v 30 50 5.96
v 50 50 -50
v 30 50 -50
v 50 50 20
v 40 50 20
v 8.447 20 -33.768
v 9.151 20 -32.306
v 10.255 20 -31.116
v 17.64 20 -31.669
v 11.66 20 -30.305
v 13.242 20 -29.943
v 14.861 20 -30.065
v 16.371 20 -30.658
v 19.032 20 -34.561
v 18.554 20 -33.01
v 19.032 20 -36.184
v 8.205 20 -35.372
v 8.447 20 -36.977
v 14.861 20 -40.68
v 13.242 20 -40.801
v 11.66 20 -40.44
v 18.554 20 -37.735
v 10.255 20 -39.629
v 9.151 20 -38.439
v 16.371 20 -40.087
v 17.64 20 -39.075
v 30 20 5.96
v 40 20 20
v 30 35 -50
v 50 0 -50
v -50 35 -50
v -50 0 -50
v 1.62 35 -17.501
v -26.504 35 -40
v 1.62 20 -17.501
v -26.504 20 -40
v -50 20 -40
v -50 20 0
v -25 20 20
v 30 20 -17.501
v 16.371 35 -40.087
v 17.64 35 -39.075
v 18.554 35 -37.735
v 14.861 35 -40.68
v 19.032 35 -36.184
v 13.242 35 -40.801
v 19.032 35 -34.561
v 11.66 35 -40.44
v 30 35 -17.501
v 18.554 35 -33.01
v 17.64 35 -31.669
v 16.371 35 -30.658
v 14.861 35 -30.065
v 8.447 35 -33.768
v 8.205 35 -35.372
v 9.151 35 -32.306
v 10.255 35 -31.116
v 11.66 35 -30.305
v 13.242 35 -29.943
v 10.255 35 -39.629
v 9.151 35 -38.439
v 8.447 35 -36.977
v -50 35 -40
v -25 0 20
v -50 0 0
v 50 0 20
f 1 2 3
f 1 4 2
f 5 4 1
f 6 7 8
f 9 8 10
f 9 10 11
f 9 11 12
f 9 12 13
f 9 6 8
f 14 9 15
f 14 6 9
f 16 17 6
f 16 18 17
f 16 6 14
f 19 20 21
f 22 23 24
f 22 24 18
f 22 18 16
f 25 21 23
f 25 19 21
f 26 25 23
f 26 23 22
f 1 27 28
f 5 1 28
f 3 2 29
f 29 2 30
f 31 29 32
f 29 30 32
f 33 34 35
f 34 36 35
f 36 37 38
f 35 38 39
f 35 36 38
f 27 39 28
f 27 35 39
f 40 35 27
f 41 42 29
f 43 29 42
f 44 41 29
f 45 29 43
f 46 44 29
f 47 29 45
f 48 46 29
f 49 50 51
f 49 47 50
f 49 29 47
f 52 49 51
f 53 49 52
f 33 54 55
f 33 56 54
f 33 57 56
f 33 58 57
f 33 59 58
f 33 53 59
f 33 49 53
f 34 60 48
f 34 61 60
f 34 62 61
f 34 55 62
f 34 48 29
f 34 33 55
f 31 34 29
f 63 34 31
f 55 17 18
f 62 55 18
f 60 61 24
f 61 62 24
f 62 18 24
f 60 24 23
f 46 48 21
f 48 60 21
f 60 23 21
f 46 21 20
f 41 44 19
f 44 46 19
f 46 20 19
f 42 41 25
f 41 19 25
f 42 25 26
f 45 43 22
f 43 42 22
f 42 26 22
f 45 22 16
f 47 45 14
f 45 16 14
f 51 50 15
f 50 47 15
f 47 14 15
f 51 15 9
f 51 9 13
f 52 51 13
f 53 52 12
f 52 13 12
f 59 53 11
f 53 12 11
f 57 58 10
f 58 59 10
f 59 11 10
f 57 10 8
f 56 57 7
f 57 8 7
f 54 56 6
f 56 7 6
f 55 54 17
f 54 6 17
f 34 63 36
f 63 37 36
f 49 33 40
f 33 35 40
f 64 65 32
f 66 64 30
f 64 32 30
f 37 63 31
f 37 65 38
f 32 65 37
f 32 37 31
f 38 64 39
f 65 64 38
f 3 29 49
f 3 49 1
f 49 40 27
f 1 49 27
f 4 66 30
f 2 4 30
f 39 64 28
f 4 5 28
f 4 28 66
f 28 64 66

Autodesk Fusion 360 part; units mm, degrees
sketch "Sketch1" plane through (0, 0, 0) normal (0, 1, 0) x (1, 0, 0)
  line L0 (-50, 50) -> (50, 50)
  line L1 (50, 50) -> (50, -20)
  line L2 (50, -20) -> (-25, -20)
  line L3 (-50, 0) -> (-50, 50)
  line L4 (-25, -20) -> (-50, 0)
extrude "Extrude1" add sketch "Sketch1" along normal blind 20
sketch "Sketch2" plane through (0, 20, 0) normal (0, 1, 0) x (-1, 0, 0)
  line L0 (25, 20) -> (-50, 20)
  line L1 (-50, 20) -> (-50, -50)
  line L2 (-50, -50) -> (50, -50)
  line L3 (50, -50) -> (50, 0)
  line L4 (50, 0) -> (25, 20)
  line L5 (-50, 20) -> (-50, -50)
  line L6 (25, 20) -> (-50, 20)
  line L7 (50, 0) -> (25, 20)
  line L8 (50, -50) -> (50, 0)
  line L9 (-50, -50) -> (50, -50)
  line L10 (50, -40) -> (26.5041, -40)
  line L11 (26.5041, -40) -> (-1.6201, -17.5006)
  line L12 (-1.6201, -17.5006) -> (-30, -17.5006)
  line L13 (-30, -17.5006) -> (-30, 5.9595)
  line L14 (-30, 5.9595) -> (-40, 20)
  circle A0 centre (-13.6491, -35.3724) radius 5.4442
  line L15 (-30, -17.5006) -> (-30, -50)
extrude "Extrude2" add sketch "Sketch2" along normal blind 15 contours L2 L3 L8 L9 L10 L11 L12 L15
extrude "Extrude3" add sketch "Sketch2" along normal blind 30 contours L0 L1 L2 L5 L6 L9 L13 L14 L15
sketch "Sketch3" plane through (30, 0, 0) normal (-1, 0, 0) x (0, 0, 1)
  line L0 (-50, 35) -> (-17.5006, 35)
  line L1 (-17.5006, 35) -> (-17.5006, 20)
  line L2 (-17.5006, 20) -> (5.9595, 20)
  line L3 (5.9595, 20) -> (5.9595, 50)
  line L4 (5.9595, 50) -> (-50, 50)
  line L5 (-50, 50) -> (-50, 35)
  circle A0 centre (-5, 30) radius 4.5807
extrude "Extrude4" cut sketch "Sketch3" along normal through all contours A0
